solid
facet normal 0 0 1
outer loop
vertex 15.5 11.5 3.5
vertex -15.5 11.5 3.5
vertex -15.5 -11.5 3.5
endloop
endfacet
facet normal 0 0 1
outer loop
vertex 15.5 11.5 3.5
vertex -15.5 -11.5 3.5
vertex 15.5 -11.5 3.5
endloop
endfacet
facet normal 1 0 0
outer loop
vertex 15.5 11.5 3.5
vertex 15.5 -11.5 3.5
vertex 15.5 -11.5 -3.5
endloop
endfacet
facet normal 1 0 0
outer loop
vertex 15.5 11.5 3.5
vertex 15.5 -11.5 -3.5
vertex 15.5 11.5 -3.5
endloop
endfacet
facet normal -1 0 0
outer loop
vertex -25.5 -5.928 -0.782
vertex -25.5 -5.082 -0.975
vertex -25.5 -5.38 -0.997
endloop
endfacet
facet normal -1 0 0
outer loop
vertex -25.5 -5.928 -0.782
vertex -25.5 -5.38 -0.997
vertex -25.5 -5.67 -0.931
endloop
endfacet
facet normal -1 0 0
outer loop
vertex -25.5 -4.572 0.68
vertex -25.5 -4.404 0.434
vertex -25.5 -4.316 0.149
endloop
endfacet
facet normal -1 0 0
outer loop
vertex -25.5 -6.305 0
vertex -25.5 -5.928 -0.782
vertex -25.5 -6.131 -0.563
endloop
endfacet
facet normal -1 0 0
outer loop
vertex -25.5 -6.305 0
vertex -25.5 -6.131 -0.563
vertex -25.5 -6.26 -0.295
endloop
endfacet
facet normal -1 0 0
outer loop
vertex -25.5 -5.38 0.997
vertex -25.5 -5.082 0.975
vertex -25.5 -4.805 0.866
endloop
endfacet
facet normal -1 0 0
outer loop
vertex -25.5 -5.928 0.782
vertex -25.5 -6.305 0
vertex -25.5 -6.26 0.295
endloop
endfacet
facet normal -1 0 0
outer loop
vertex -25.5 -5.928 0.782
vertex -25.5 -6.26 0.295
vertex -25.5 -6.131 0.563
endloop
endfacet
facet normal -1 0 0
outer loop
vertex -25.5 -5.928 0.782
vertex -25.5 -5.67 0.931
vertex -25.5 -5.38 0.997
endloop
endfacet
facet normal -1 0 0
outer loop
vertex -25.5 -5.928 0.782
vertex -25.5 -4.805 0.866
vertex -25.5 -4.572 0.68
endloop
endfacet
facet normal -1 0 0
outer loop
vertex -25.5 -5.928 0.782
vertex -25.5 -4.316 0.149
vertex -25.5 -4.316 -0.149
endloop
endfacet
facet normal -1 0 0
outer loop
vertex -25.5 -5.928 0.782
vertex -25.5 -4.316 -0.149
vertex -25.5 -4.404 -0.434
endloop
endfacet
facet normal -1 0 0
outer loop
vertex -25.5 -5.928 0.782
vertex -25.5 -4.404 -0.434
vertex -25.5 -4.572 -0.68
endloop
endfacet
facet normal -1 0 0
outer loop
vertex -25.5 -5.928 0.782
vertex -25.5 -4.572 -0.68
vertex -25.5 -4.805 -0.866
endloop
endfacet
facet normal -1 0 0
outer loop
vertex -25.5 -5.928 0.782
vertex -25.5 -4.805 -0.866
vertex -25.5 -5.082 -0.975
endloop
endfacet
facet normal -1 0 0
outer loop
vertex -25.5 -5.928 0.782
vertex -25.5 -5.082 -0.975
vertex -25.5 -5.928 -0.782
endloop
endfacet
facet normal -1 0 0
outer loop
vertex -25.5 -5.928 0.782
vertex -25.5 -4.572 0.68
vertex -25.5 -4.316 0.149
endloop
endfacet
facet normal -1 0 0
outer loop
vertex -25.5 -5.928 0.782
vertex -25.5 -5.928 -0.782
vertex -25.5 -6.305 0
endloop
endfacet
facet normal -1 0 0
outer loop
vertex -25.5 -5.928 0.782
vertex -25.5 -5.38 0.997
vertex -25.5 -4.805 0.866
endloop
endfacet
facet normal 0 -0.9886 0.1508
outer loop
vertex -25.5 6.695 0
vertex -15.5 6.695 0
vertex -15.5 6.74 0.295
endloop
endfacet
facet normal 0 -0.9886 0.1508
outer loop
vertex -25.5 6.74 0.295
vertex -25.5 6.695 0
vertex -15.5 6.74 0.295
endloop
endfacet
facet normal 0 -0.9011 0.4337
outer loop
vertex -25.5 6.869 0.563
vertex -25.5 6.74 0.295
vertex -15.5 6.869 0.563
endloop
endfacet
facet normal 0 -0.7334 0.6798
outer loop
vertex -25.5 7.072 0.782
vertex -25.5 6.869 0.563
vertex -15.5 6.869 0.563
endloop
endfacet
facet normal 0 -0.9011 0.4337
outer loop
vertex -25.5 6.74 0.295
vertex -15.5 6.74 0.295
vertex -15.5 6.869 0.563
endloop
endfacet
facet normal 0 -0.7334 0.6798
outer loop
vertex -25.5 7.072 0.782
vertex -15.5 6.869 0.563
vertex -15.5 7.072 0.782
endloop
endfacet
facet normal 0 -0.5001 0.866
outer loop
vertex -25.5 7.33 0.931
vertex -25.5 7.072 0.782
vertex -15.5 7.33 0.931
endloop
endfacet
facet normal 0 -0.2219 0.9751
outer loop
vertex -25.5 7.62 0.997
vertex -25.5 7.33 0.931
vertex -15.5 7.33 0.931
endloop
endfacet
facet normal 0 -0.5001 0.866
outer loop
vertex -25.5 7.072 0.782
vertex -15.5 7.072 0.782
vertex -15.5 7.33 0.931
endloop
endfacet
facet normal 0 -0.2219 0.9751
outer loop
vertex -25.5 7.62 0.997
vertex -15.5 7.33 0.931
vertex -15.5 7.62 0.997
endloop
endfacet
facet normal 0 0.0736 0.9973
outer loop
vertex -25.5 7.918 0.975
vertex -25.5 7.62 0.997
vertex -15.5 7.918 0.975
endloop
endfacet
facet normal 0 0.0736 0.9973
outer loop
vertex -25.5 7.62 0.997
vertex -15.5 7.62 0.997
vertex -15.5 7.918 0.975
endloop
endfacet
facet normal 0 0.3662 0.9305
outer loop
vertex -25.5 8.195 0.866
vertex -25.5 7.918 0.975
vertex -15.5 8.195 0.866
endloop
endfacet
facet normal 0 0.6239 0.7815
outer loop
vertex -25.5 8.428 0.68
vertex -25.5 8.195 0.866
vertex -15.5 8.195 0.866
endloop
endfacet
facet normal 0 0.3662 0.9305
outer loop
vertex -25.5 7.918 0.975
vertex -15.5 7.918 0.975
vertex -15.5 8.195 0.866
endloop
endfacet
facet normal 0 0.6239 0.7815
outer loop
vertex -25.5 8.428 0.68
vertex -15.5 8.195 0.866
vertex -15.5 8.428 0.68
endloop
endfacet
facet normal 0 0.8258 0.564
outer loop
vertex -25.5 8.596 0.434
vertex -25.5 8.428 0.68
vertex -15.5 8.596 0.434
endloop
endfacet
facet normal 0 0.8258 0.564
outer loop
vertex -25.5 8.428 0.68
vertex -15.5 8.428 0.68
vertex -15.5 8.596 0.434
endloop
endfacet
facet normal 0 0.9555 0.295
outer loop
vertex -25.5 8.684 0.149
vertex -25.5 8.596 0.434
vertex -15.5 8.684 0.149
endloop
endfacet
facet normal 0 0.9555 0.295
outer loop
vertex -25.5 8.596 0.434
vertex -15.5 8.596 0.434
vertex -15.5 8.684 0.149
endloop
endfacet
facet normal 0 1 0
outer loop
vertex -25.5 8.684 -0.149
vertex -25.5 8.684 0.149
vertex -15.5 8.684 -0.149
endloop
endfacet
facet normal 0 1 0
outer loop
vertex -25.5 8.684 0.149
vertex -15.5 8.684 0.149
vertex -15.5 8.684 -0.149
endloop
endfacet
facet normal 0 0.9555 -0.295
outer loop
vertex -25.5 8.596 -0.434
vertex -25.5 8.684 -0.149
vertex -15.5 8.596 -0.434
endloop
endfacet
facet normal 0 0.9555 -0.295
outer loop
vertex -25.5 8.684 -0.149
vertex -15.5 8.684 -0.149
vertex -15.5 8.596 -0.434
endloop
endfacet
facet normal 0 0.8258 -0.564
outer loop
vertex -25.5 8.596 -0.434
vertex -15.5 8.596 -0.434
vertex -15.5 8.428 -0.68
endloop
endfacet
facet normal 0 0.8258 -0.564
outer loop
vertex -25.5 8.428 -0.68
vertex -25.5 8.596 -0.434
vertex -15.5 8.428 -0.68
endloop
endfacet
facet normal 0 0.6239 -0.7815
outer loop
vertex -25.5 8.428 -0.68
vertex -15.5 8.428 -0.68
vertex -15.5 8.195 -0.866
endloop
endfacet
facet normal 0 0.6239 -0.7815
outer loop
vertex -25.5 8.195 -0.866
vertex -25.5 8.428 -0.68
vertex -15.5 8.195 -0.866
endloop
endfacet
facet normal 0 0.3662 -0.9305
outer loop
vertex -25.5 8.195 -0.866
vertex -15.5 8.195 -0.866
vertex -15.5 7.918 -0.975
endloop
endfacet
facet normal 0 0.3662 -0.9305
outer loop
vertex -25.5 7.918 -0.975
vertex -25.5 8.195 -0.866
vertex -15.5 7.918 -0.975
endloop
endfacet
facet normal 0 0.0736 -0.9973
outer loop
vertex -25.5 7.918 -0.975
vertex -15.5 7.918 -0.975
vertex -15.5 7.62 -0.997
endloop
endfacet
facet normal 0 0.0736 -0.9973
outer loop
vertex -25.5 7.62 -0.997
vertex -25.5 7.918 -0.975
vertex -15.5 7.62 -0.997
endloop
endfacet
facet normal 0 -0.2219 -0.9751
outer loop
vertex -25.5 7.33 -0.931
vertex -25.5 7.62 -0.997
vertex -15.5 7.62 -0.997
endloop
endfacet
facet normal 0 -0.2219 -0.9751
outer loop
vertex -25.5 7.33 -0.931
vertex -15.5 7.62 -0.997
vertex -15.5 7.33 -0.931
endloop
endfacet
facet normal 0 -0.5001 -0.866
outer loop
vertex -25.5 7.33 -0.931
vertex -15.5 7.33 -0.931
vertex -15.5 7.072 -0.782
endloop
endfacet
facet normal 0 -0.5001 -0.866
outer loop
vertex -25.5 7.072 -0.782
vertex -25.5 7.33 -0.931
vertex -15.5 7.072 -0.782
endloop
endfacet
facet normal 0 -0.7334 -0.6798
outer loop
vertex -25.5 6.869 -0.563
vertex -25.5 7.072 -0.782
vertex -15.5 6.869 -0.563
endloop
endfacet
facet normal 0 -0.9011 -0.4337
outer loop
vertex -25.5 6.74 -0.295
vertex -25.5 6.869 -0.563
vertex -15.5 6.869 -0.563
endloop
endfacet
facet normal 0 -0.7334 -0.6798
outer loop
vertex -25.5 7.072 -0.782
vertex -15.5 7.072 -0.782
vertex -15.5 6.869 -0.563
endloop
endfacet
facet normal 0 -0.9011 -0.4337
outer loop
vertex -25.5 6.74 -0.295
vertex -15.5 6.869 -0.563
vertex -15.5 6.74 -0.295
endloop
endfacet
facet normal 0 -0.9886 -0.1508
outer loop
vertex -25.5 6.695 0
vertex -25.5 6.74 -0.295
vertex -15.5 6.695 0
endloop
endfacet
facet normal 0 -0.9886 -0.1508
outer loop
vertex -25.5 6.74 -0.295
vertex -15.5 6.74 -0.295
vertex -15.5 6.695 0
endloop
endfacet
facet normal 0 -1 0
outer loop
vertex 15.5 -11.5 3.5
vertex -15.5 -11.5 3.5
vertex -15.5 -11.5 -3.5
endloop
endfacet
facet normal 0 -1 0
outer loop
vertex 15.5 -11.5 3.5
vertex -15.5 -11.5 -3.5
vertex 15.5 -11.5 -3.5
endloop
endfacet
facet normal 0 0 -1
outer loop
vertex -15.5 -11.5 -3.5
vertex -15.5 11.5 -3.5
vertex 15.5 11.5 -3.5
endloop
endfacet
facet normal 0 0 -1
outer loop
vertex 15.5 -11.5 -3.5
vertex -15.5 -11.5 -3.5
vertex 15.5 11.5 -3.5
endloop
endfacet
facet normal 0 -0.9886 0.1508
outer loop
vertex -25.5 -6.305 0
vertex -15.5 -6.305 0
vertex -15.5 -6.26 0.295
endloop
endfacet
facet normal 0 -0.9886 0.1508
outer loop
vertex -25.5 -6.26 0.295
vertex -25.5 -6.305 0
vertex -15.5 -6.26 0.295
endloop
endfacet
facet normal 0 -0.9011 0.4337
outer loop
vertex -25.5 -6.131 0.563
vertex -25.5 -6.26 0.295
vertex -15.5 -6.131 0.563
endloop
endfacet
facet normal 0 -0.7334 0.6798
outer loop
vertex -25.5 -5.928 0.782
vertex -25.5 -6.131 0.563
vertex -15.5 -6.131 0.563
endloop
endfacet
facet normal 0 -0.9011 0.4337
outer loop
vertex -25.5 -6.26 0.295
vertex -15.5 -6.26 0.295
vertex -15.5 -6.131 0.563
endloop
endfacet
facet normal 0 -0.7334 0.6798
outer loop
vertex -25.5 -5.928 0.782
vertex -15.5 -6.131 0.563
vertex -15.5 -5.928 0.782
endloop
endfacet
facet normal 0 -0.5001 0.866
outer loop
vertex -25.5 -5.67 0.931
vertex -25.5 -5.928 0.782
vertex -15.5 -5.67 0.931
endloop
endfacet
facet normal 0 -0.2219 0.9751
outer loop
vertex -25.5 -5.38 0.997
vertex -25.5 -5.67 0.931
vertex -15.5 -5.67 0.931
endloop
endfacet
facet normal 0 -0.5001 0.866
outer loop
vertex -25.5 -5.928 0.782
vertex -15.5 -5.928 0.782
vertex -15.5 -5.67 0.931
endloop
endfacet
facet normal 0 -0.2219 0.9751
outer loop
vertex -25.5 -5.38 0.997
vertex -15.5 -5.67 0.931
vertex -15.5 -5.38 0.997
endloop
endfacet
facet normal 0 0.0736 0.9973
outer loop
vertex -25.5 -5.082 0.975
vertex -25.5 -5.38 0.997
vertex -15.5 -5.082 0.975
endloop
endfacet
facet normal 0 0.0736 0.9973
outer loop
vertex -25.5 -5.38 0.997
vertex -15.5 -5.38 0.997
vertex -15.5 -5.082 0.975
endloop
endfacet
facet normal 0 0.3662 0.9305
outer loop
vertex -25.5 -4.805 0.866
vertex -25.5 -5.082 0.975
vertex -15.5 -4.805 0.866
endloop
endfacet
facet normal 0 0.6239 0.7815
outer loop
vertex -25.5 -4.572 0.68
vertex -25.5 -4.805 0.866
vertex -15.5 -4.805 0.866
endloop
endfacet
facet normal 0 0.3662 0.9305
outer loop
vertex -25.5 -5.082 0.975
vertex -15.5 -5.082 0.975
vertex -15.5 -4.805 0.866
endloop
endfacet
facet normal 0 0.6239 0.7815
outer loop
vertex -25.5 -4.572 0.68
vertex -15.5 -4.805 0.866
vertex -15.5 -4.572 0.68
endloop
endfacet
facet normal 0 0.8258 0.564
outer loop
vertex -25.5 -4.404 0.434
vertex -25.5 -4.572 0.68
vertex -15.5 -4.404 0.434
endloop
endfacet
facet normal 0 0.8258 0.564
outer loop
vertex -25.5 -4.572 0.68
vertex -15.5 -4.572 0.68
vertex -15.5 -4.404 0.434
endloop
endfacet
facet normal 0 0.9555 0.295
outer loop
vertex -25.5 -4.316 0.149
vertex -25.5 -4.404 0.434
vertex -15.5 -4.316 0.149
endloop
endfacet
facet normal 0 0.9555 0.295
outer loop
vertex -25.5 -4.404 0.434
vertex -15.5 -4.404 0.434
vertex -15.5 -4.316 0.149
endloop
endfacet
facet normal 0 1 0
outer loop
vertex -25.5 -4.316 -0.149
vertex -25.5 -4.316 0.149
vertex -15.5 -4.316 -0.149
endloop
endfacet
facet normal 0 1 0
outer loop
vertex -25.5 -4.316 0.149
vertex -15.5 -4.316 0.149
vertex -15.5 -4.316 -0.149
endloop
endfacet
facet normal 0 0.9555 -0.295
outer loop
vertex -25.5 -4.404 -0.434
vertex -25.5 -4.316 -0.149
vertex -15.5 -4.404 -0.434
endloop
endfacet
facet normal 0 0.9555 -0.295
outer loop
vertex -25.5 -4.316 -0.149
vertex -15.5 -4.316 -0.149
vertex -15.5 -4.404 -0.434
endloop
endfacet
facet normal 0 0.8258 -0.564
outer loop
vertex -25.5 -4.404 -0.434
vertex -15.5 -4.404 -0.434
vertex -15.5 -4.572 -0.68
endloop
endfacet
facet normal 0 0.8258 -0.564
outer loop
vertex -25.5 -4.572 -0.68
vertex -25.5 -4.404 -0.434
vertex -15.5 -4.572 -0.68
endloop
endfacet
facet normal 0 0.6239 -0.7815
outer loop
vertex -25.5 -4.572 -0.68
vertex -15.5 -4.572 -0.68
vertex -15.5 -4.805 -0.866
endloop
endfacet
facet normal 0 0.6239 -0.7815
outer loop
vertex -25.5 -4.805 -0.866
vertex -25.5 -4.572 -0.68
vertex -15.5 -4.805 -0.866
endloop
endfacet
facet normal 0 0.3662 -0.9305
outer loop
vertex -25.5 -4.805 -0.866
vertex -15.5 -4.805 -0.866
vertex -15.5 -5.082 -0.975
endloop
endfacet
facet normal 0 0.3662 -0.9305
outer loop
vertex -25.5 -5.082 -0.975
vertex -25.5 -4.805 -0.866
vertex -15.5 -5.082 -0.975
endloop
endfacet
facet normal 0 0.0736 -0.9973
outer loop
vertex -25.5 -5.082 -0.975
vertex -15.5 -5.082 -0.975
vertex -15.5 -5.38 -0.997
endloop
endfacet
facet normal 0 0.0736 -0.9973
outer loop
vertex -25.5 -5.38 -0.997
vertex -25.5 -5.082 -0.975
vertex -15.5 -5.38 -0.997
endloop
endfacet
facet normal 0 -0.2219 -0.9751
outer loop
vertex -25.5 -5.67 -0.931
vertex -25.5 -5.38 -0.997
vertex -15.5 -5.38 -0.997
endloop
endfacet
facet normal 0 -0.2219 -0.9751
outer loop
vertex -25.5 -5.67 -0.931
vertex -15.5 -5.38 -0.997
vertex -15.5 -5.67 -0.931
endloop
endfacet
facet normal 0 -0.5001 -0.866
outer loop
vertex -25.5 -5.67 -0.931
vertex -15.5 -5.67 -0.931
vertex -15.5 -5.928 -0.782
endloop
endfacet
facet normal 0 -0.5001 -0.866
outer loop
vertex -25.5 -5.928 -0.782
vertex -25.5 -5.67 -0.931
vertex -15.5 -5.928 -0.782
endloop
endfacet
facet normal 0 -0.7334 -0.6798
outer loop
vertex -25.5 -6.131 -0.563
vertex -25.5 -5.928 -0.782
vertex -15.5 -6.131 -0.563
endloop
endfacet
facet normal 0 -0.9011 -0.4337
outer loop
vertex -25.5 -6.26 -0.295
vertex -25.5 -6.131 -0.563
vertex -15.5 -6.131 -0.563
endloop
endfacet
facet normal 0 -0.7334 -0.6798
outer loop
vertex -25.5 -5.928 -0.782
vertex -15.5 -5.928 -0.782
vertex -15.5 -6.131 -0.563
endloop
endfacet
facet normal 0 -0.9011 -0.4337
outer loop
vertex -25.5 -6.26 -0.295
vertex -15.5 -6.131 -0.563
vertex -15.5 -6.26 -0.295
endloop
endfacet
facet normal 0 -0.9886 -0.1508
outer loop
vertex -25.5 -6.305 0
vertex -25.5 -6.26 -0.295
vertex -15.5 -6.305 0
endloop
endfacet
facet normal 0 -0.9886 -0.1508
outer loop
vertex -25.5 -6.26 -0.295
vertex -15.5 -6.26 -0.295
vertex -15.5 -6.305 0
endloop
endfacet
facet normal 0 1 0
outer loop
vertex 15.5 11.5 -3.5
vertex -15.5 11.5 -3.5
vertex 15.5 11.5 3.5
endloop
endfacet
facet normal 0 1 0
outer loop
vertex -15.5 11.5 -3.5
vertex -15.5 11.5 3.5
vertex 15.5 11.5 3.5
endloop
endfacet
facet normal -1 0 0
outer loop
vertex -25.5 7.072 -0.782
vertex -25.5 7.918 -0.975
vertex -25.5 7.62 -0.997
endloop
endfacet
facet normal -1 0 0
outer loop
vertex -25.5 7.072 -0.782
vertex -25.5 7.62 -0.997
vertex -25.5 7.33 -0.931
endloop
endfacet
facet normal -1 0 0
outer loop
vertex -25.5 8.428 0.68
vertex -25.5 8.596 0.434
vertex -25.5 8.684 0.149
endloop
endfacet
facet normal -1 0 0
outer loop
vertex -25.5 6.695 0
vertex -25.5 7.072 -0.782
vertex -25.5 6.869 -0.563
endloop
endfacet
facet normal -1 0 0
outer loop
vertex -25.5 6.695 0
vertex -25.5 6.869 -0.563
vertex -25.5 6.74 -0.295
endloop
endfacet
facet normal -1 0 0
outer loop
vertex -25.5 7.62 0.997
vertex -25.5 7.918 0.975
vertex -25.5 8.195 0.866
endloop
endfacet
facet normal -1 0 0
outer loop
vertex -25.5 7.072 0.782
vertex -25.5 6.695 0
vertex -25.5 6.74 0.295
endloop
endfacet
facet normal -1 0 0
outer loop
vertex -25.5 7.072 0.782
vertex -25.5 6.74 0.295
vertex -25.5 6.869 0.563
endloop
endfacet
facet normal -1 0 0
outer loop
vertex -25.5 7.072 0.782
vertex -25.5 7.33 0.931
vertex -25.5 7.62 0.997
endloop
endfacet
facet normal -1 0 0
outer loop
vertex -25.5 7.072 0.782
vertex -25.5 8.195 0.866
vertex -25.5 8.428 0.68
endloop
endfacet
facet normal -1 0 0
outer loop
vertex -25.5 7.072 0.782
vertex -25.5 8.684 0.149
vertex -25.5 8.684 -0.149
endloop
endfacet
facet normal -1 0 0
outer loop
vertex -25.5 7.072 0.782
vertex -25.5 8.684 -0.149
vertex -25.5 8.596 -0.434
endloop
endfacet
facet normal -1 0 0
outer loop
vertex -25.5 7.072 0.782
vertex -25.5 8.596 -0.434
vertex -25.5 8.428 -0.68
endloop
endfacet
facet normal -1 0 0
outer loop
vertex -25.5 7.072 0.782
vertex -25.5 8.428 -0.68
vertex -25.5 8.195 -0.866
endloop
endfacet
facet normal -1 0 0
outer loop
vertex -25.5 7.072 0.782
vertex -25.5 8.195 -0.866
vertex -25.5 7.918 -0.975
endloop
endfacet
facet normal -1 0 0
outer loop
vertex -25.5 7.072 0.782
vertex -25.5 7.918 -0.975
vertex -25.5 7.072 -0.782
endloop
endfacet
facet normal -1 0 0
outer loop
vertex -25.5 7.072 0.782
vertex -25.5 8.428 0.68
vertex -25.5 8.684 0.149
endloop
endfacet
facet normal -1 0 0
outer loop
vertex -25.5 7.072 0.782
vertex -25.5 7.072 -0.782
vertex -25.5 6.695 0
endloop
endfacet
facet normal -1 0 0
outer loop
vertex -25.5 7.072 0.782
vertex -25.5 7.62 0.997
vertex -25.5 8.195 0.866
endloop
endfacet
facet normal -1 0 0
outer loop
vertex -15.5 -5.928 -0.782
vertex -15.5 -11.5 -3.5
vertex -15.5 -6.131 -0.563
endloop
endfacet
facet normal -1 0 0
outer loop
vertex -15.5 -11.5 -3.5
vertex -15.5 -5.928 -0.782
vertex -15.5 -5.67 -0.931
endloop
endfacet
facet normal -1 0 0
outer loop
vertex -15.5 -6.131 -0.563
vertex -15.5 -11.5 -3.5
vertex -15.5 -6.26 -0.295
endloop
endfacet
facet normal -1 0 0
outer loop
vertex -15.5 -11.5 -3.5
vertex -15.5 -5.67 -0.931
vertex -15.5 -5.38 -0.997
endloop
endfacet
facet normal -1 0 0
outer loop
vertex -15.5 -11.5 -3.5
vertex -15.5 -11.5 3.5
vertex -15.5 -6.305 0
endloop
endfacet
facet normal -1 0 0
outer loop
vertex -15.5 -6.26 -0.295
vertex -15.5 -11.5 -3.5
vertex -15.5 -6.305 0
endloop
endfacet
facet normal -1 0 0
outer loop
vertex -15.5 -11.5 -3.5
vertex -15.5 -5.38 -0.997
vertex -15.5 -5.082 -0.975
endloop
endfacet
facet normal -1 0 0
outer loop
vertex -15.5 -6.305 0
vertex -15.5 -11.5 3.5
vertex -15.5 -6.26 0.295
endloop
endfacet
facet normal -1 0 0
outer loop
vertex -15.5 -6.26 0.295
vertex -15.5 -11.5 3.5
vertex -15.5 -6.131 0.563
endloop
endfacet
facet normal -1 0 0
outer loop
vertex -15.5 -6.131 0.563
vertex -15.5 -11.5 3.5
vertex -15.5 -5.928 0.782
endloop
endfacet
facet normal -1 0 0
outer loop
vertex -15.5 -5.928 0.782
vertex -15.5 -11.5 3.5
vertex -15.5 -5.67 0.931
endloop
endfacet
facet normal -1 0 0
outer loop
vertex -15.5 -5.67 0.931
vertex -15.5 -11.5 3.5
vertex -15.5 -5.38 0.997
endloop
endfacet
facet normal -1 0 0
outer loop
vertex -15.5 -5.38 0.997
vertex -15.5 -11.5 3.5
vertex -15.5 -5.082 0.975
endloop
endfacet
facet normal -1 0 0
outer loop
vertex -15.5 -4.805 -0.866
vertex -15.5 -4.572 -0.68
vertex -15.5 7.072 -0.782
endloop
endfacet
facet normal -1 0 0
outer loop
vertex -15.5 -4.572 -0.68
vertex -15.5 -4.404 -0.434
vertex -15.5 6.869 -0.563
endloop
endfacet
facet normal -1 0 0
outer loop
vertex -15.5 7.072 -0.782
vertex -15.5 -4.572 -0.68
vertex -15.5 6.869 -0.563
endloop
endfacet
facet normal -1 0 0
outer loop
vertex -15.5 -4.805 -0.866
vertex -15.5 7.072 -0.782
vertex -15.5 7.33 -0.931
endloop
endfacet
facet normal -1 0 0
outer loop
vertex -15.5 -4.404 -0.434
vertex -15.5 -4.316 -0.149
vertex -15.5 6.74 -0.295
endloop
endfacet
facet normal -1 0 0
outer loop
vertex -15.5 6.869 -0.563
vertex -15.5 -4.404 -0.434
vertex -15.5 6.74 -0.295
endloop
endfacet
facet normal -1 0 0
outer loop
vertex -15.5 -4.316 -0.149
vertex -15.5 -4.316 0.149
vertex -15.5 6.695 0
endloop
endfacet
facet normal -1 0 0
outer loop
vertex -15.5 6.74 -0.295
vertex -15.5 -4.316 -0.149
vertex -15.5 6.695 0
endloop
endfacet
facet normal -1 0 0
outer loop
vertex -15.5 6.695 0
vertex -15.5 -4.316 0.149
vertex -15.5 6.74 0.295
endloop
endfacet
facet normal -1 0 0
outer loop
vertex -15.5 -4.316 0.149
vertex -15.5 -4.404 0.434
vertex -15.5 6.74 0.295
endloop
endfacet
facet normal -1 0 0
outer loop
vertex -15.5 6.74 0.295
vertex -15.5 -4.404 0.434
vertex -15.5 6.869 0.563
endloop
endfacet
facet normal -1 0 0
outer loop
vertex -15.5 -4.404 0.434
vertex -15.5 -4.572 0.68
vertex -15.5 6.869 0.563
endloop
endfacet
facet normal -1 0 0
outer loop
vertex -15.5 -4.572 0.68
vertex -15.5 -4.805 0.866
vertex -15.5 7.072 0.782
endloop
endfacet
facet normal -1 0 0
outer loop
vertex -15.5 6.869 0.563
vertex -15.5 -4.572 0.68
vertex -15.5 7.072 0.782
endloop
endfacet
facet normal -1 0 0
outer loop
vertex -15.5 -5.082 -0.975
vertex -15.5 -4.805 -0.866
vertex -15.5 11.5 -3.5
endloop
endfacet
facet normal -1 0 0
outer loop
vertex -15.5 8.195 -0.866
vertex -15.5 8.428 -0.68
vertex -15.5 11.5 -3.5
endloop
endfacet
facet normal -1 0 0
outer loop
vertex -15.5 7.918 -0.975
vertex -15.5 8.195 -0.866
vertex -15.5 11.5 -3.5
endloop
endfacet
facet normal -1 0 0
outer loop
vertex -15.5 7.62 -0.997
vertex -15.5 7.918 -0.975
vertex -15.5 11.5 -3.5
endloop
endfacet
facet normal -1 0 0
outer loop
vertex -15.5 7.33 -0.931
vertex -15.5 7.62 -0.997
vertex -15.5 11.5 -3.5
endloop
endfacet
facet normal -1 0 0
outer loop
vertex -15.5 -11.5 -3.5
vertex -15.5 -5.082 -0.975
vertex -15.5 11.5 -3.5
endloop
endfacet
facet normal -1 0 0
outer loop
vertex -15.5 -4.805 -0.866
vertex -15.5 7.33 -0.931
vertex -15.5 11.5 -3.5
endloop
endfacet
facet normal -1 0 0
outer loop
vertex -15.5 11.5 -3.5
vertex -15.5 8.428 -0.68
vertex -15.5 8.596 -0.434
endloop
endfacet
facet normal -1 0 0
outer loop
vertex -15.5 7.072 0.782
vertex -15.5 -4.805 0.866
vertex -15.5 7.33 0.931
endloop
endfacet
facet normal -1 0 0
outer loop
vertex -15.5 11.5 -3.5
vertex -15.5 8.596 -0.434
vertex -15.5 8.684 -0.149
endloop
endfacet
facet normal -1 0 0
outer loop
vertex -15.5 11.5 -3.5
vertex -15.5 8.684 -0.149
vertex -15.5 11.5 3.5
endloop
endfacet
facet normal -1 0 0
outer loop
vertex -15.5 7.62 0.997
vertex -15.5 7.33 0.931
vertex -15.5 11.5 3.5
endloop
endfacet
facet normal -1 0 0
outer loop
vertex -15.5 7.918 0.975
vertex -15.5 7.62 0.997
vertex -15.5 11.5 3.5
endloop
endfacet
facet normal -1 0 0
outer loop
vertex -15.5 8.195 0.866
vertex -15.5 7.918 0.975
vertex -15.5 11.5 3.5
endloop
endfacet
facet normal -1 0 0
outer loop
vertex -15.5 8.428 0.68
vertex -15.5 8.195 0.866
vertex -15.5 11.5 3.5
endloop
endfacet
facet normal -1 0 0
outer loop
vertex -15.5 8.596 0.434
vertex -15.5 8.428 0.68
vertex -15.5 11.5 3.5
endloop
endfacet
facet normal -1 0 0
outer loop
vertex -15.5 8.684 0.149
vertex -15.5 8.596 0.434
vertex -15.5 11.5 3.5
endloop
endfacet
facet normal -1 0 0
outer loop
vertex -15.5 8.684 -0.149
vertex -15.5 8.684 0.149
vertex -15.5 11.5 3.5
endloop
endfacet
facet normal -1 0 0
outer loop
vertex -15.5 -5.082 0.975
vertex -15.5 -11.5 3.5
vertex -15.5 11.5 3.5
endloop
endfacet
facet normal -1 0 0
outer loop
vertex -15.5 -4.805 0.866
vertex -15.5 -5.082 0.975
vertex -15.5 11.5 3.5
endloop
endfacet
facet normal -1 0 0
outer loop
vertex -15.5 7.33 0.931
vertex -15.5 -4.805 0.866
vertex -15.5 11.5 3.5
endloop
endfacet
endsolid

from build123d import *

# Parameters (mm, degrees)
SKETCH_W     = 31
SKETCH_H     = 23
PAD_DEPTH    = 3.5
SKETCH001_R  = 1
PAD001_DEPTH = 10


with BuildPart() as part:
    # Sketch → Pad (new body, symmetric)
    with BuildSketch(Plane.XY):
        Rectangle(SKETCH_W, SKETCH_H)
    extrude(amount=PAD_DEPTH, both=True)

    # Sketch001 (on Face4 of Pad) → Pad001 (join)
    with BuildSketch(Plane(origin=(-15.5, 0, 0), x_dir=(0, -1, 0), z_dir=(-1, 0, 0))):
        with Locations((-7.695191, 0)):
            Circle(SKETCH001_R)
        with Locations((5.304809, 0)):
            Circle(SKETCH001_R)
    extrude(amount=PAD001_DEPTH)


solid = part.part
